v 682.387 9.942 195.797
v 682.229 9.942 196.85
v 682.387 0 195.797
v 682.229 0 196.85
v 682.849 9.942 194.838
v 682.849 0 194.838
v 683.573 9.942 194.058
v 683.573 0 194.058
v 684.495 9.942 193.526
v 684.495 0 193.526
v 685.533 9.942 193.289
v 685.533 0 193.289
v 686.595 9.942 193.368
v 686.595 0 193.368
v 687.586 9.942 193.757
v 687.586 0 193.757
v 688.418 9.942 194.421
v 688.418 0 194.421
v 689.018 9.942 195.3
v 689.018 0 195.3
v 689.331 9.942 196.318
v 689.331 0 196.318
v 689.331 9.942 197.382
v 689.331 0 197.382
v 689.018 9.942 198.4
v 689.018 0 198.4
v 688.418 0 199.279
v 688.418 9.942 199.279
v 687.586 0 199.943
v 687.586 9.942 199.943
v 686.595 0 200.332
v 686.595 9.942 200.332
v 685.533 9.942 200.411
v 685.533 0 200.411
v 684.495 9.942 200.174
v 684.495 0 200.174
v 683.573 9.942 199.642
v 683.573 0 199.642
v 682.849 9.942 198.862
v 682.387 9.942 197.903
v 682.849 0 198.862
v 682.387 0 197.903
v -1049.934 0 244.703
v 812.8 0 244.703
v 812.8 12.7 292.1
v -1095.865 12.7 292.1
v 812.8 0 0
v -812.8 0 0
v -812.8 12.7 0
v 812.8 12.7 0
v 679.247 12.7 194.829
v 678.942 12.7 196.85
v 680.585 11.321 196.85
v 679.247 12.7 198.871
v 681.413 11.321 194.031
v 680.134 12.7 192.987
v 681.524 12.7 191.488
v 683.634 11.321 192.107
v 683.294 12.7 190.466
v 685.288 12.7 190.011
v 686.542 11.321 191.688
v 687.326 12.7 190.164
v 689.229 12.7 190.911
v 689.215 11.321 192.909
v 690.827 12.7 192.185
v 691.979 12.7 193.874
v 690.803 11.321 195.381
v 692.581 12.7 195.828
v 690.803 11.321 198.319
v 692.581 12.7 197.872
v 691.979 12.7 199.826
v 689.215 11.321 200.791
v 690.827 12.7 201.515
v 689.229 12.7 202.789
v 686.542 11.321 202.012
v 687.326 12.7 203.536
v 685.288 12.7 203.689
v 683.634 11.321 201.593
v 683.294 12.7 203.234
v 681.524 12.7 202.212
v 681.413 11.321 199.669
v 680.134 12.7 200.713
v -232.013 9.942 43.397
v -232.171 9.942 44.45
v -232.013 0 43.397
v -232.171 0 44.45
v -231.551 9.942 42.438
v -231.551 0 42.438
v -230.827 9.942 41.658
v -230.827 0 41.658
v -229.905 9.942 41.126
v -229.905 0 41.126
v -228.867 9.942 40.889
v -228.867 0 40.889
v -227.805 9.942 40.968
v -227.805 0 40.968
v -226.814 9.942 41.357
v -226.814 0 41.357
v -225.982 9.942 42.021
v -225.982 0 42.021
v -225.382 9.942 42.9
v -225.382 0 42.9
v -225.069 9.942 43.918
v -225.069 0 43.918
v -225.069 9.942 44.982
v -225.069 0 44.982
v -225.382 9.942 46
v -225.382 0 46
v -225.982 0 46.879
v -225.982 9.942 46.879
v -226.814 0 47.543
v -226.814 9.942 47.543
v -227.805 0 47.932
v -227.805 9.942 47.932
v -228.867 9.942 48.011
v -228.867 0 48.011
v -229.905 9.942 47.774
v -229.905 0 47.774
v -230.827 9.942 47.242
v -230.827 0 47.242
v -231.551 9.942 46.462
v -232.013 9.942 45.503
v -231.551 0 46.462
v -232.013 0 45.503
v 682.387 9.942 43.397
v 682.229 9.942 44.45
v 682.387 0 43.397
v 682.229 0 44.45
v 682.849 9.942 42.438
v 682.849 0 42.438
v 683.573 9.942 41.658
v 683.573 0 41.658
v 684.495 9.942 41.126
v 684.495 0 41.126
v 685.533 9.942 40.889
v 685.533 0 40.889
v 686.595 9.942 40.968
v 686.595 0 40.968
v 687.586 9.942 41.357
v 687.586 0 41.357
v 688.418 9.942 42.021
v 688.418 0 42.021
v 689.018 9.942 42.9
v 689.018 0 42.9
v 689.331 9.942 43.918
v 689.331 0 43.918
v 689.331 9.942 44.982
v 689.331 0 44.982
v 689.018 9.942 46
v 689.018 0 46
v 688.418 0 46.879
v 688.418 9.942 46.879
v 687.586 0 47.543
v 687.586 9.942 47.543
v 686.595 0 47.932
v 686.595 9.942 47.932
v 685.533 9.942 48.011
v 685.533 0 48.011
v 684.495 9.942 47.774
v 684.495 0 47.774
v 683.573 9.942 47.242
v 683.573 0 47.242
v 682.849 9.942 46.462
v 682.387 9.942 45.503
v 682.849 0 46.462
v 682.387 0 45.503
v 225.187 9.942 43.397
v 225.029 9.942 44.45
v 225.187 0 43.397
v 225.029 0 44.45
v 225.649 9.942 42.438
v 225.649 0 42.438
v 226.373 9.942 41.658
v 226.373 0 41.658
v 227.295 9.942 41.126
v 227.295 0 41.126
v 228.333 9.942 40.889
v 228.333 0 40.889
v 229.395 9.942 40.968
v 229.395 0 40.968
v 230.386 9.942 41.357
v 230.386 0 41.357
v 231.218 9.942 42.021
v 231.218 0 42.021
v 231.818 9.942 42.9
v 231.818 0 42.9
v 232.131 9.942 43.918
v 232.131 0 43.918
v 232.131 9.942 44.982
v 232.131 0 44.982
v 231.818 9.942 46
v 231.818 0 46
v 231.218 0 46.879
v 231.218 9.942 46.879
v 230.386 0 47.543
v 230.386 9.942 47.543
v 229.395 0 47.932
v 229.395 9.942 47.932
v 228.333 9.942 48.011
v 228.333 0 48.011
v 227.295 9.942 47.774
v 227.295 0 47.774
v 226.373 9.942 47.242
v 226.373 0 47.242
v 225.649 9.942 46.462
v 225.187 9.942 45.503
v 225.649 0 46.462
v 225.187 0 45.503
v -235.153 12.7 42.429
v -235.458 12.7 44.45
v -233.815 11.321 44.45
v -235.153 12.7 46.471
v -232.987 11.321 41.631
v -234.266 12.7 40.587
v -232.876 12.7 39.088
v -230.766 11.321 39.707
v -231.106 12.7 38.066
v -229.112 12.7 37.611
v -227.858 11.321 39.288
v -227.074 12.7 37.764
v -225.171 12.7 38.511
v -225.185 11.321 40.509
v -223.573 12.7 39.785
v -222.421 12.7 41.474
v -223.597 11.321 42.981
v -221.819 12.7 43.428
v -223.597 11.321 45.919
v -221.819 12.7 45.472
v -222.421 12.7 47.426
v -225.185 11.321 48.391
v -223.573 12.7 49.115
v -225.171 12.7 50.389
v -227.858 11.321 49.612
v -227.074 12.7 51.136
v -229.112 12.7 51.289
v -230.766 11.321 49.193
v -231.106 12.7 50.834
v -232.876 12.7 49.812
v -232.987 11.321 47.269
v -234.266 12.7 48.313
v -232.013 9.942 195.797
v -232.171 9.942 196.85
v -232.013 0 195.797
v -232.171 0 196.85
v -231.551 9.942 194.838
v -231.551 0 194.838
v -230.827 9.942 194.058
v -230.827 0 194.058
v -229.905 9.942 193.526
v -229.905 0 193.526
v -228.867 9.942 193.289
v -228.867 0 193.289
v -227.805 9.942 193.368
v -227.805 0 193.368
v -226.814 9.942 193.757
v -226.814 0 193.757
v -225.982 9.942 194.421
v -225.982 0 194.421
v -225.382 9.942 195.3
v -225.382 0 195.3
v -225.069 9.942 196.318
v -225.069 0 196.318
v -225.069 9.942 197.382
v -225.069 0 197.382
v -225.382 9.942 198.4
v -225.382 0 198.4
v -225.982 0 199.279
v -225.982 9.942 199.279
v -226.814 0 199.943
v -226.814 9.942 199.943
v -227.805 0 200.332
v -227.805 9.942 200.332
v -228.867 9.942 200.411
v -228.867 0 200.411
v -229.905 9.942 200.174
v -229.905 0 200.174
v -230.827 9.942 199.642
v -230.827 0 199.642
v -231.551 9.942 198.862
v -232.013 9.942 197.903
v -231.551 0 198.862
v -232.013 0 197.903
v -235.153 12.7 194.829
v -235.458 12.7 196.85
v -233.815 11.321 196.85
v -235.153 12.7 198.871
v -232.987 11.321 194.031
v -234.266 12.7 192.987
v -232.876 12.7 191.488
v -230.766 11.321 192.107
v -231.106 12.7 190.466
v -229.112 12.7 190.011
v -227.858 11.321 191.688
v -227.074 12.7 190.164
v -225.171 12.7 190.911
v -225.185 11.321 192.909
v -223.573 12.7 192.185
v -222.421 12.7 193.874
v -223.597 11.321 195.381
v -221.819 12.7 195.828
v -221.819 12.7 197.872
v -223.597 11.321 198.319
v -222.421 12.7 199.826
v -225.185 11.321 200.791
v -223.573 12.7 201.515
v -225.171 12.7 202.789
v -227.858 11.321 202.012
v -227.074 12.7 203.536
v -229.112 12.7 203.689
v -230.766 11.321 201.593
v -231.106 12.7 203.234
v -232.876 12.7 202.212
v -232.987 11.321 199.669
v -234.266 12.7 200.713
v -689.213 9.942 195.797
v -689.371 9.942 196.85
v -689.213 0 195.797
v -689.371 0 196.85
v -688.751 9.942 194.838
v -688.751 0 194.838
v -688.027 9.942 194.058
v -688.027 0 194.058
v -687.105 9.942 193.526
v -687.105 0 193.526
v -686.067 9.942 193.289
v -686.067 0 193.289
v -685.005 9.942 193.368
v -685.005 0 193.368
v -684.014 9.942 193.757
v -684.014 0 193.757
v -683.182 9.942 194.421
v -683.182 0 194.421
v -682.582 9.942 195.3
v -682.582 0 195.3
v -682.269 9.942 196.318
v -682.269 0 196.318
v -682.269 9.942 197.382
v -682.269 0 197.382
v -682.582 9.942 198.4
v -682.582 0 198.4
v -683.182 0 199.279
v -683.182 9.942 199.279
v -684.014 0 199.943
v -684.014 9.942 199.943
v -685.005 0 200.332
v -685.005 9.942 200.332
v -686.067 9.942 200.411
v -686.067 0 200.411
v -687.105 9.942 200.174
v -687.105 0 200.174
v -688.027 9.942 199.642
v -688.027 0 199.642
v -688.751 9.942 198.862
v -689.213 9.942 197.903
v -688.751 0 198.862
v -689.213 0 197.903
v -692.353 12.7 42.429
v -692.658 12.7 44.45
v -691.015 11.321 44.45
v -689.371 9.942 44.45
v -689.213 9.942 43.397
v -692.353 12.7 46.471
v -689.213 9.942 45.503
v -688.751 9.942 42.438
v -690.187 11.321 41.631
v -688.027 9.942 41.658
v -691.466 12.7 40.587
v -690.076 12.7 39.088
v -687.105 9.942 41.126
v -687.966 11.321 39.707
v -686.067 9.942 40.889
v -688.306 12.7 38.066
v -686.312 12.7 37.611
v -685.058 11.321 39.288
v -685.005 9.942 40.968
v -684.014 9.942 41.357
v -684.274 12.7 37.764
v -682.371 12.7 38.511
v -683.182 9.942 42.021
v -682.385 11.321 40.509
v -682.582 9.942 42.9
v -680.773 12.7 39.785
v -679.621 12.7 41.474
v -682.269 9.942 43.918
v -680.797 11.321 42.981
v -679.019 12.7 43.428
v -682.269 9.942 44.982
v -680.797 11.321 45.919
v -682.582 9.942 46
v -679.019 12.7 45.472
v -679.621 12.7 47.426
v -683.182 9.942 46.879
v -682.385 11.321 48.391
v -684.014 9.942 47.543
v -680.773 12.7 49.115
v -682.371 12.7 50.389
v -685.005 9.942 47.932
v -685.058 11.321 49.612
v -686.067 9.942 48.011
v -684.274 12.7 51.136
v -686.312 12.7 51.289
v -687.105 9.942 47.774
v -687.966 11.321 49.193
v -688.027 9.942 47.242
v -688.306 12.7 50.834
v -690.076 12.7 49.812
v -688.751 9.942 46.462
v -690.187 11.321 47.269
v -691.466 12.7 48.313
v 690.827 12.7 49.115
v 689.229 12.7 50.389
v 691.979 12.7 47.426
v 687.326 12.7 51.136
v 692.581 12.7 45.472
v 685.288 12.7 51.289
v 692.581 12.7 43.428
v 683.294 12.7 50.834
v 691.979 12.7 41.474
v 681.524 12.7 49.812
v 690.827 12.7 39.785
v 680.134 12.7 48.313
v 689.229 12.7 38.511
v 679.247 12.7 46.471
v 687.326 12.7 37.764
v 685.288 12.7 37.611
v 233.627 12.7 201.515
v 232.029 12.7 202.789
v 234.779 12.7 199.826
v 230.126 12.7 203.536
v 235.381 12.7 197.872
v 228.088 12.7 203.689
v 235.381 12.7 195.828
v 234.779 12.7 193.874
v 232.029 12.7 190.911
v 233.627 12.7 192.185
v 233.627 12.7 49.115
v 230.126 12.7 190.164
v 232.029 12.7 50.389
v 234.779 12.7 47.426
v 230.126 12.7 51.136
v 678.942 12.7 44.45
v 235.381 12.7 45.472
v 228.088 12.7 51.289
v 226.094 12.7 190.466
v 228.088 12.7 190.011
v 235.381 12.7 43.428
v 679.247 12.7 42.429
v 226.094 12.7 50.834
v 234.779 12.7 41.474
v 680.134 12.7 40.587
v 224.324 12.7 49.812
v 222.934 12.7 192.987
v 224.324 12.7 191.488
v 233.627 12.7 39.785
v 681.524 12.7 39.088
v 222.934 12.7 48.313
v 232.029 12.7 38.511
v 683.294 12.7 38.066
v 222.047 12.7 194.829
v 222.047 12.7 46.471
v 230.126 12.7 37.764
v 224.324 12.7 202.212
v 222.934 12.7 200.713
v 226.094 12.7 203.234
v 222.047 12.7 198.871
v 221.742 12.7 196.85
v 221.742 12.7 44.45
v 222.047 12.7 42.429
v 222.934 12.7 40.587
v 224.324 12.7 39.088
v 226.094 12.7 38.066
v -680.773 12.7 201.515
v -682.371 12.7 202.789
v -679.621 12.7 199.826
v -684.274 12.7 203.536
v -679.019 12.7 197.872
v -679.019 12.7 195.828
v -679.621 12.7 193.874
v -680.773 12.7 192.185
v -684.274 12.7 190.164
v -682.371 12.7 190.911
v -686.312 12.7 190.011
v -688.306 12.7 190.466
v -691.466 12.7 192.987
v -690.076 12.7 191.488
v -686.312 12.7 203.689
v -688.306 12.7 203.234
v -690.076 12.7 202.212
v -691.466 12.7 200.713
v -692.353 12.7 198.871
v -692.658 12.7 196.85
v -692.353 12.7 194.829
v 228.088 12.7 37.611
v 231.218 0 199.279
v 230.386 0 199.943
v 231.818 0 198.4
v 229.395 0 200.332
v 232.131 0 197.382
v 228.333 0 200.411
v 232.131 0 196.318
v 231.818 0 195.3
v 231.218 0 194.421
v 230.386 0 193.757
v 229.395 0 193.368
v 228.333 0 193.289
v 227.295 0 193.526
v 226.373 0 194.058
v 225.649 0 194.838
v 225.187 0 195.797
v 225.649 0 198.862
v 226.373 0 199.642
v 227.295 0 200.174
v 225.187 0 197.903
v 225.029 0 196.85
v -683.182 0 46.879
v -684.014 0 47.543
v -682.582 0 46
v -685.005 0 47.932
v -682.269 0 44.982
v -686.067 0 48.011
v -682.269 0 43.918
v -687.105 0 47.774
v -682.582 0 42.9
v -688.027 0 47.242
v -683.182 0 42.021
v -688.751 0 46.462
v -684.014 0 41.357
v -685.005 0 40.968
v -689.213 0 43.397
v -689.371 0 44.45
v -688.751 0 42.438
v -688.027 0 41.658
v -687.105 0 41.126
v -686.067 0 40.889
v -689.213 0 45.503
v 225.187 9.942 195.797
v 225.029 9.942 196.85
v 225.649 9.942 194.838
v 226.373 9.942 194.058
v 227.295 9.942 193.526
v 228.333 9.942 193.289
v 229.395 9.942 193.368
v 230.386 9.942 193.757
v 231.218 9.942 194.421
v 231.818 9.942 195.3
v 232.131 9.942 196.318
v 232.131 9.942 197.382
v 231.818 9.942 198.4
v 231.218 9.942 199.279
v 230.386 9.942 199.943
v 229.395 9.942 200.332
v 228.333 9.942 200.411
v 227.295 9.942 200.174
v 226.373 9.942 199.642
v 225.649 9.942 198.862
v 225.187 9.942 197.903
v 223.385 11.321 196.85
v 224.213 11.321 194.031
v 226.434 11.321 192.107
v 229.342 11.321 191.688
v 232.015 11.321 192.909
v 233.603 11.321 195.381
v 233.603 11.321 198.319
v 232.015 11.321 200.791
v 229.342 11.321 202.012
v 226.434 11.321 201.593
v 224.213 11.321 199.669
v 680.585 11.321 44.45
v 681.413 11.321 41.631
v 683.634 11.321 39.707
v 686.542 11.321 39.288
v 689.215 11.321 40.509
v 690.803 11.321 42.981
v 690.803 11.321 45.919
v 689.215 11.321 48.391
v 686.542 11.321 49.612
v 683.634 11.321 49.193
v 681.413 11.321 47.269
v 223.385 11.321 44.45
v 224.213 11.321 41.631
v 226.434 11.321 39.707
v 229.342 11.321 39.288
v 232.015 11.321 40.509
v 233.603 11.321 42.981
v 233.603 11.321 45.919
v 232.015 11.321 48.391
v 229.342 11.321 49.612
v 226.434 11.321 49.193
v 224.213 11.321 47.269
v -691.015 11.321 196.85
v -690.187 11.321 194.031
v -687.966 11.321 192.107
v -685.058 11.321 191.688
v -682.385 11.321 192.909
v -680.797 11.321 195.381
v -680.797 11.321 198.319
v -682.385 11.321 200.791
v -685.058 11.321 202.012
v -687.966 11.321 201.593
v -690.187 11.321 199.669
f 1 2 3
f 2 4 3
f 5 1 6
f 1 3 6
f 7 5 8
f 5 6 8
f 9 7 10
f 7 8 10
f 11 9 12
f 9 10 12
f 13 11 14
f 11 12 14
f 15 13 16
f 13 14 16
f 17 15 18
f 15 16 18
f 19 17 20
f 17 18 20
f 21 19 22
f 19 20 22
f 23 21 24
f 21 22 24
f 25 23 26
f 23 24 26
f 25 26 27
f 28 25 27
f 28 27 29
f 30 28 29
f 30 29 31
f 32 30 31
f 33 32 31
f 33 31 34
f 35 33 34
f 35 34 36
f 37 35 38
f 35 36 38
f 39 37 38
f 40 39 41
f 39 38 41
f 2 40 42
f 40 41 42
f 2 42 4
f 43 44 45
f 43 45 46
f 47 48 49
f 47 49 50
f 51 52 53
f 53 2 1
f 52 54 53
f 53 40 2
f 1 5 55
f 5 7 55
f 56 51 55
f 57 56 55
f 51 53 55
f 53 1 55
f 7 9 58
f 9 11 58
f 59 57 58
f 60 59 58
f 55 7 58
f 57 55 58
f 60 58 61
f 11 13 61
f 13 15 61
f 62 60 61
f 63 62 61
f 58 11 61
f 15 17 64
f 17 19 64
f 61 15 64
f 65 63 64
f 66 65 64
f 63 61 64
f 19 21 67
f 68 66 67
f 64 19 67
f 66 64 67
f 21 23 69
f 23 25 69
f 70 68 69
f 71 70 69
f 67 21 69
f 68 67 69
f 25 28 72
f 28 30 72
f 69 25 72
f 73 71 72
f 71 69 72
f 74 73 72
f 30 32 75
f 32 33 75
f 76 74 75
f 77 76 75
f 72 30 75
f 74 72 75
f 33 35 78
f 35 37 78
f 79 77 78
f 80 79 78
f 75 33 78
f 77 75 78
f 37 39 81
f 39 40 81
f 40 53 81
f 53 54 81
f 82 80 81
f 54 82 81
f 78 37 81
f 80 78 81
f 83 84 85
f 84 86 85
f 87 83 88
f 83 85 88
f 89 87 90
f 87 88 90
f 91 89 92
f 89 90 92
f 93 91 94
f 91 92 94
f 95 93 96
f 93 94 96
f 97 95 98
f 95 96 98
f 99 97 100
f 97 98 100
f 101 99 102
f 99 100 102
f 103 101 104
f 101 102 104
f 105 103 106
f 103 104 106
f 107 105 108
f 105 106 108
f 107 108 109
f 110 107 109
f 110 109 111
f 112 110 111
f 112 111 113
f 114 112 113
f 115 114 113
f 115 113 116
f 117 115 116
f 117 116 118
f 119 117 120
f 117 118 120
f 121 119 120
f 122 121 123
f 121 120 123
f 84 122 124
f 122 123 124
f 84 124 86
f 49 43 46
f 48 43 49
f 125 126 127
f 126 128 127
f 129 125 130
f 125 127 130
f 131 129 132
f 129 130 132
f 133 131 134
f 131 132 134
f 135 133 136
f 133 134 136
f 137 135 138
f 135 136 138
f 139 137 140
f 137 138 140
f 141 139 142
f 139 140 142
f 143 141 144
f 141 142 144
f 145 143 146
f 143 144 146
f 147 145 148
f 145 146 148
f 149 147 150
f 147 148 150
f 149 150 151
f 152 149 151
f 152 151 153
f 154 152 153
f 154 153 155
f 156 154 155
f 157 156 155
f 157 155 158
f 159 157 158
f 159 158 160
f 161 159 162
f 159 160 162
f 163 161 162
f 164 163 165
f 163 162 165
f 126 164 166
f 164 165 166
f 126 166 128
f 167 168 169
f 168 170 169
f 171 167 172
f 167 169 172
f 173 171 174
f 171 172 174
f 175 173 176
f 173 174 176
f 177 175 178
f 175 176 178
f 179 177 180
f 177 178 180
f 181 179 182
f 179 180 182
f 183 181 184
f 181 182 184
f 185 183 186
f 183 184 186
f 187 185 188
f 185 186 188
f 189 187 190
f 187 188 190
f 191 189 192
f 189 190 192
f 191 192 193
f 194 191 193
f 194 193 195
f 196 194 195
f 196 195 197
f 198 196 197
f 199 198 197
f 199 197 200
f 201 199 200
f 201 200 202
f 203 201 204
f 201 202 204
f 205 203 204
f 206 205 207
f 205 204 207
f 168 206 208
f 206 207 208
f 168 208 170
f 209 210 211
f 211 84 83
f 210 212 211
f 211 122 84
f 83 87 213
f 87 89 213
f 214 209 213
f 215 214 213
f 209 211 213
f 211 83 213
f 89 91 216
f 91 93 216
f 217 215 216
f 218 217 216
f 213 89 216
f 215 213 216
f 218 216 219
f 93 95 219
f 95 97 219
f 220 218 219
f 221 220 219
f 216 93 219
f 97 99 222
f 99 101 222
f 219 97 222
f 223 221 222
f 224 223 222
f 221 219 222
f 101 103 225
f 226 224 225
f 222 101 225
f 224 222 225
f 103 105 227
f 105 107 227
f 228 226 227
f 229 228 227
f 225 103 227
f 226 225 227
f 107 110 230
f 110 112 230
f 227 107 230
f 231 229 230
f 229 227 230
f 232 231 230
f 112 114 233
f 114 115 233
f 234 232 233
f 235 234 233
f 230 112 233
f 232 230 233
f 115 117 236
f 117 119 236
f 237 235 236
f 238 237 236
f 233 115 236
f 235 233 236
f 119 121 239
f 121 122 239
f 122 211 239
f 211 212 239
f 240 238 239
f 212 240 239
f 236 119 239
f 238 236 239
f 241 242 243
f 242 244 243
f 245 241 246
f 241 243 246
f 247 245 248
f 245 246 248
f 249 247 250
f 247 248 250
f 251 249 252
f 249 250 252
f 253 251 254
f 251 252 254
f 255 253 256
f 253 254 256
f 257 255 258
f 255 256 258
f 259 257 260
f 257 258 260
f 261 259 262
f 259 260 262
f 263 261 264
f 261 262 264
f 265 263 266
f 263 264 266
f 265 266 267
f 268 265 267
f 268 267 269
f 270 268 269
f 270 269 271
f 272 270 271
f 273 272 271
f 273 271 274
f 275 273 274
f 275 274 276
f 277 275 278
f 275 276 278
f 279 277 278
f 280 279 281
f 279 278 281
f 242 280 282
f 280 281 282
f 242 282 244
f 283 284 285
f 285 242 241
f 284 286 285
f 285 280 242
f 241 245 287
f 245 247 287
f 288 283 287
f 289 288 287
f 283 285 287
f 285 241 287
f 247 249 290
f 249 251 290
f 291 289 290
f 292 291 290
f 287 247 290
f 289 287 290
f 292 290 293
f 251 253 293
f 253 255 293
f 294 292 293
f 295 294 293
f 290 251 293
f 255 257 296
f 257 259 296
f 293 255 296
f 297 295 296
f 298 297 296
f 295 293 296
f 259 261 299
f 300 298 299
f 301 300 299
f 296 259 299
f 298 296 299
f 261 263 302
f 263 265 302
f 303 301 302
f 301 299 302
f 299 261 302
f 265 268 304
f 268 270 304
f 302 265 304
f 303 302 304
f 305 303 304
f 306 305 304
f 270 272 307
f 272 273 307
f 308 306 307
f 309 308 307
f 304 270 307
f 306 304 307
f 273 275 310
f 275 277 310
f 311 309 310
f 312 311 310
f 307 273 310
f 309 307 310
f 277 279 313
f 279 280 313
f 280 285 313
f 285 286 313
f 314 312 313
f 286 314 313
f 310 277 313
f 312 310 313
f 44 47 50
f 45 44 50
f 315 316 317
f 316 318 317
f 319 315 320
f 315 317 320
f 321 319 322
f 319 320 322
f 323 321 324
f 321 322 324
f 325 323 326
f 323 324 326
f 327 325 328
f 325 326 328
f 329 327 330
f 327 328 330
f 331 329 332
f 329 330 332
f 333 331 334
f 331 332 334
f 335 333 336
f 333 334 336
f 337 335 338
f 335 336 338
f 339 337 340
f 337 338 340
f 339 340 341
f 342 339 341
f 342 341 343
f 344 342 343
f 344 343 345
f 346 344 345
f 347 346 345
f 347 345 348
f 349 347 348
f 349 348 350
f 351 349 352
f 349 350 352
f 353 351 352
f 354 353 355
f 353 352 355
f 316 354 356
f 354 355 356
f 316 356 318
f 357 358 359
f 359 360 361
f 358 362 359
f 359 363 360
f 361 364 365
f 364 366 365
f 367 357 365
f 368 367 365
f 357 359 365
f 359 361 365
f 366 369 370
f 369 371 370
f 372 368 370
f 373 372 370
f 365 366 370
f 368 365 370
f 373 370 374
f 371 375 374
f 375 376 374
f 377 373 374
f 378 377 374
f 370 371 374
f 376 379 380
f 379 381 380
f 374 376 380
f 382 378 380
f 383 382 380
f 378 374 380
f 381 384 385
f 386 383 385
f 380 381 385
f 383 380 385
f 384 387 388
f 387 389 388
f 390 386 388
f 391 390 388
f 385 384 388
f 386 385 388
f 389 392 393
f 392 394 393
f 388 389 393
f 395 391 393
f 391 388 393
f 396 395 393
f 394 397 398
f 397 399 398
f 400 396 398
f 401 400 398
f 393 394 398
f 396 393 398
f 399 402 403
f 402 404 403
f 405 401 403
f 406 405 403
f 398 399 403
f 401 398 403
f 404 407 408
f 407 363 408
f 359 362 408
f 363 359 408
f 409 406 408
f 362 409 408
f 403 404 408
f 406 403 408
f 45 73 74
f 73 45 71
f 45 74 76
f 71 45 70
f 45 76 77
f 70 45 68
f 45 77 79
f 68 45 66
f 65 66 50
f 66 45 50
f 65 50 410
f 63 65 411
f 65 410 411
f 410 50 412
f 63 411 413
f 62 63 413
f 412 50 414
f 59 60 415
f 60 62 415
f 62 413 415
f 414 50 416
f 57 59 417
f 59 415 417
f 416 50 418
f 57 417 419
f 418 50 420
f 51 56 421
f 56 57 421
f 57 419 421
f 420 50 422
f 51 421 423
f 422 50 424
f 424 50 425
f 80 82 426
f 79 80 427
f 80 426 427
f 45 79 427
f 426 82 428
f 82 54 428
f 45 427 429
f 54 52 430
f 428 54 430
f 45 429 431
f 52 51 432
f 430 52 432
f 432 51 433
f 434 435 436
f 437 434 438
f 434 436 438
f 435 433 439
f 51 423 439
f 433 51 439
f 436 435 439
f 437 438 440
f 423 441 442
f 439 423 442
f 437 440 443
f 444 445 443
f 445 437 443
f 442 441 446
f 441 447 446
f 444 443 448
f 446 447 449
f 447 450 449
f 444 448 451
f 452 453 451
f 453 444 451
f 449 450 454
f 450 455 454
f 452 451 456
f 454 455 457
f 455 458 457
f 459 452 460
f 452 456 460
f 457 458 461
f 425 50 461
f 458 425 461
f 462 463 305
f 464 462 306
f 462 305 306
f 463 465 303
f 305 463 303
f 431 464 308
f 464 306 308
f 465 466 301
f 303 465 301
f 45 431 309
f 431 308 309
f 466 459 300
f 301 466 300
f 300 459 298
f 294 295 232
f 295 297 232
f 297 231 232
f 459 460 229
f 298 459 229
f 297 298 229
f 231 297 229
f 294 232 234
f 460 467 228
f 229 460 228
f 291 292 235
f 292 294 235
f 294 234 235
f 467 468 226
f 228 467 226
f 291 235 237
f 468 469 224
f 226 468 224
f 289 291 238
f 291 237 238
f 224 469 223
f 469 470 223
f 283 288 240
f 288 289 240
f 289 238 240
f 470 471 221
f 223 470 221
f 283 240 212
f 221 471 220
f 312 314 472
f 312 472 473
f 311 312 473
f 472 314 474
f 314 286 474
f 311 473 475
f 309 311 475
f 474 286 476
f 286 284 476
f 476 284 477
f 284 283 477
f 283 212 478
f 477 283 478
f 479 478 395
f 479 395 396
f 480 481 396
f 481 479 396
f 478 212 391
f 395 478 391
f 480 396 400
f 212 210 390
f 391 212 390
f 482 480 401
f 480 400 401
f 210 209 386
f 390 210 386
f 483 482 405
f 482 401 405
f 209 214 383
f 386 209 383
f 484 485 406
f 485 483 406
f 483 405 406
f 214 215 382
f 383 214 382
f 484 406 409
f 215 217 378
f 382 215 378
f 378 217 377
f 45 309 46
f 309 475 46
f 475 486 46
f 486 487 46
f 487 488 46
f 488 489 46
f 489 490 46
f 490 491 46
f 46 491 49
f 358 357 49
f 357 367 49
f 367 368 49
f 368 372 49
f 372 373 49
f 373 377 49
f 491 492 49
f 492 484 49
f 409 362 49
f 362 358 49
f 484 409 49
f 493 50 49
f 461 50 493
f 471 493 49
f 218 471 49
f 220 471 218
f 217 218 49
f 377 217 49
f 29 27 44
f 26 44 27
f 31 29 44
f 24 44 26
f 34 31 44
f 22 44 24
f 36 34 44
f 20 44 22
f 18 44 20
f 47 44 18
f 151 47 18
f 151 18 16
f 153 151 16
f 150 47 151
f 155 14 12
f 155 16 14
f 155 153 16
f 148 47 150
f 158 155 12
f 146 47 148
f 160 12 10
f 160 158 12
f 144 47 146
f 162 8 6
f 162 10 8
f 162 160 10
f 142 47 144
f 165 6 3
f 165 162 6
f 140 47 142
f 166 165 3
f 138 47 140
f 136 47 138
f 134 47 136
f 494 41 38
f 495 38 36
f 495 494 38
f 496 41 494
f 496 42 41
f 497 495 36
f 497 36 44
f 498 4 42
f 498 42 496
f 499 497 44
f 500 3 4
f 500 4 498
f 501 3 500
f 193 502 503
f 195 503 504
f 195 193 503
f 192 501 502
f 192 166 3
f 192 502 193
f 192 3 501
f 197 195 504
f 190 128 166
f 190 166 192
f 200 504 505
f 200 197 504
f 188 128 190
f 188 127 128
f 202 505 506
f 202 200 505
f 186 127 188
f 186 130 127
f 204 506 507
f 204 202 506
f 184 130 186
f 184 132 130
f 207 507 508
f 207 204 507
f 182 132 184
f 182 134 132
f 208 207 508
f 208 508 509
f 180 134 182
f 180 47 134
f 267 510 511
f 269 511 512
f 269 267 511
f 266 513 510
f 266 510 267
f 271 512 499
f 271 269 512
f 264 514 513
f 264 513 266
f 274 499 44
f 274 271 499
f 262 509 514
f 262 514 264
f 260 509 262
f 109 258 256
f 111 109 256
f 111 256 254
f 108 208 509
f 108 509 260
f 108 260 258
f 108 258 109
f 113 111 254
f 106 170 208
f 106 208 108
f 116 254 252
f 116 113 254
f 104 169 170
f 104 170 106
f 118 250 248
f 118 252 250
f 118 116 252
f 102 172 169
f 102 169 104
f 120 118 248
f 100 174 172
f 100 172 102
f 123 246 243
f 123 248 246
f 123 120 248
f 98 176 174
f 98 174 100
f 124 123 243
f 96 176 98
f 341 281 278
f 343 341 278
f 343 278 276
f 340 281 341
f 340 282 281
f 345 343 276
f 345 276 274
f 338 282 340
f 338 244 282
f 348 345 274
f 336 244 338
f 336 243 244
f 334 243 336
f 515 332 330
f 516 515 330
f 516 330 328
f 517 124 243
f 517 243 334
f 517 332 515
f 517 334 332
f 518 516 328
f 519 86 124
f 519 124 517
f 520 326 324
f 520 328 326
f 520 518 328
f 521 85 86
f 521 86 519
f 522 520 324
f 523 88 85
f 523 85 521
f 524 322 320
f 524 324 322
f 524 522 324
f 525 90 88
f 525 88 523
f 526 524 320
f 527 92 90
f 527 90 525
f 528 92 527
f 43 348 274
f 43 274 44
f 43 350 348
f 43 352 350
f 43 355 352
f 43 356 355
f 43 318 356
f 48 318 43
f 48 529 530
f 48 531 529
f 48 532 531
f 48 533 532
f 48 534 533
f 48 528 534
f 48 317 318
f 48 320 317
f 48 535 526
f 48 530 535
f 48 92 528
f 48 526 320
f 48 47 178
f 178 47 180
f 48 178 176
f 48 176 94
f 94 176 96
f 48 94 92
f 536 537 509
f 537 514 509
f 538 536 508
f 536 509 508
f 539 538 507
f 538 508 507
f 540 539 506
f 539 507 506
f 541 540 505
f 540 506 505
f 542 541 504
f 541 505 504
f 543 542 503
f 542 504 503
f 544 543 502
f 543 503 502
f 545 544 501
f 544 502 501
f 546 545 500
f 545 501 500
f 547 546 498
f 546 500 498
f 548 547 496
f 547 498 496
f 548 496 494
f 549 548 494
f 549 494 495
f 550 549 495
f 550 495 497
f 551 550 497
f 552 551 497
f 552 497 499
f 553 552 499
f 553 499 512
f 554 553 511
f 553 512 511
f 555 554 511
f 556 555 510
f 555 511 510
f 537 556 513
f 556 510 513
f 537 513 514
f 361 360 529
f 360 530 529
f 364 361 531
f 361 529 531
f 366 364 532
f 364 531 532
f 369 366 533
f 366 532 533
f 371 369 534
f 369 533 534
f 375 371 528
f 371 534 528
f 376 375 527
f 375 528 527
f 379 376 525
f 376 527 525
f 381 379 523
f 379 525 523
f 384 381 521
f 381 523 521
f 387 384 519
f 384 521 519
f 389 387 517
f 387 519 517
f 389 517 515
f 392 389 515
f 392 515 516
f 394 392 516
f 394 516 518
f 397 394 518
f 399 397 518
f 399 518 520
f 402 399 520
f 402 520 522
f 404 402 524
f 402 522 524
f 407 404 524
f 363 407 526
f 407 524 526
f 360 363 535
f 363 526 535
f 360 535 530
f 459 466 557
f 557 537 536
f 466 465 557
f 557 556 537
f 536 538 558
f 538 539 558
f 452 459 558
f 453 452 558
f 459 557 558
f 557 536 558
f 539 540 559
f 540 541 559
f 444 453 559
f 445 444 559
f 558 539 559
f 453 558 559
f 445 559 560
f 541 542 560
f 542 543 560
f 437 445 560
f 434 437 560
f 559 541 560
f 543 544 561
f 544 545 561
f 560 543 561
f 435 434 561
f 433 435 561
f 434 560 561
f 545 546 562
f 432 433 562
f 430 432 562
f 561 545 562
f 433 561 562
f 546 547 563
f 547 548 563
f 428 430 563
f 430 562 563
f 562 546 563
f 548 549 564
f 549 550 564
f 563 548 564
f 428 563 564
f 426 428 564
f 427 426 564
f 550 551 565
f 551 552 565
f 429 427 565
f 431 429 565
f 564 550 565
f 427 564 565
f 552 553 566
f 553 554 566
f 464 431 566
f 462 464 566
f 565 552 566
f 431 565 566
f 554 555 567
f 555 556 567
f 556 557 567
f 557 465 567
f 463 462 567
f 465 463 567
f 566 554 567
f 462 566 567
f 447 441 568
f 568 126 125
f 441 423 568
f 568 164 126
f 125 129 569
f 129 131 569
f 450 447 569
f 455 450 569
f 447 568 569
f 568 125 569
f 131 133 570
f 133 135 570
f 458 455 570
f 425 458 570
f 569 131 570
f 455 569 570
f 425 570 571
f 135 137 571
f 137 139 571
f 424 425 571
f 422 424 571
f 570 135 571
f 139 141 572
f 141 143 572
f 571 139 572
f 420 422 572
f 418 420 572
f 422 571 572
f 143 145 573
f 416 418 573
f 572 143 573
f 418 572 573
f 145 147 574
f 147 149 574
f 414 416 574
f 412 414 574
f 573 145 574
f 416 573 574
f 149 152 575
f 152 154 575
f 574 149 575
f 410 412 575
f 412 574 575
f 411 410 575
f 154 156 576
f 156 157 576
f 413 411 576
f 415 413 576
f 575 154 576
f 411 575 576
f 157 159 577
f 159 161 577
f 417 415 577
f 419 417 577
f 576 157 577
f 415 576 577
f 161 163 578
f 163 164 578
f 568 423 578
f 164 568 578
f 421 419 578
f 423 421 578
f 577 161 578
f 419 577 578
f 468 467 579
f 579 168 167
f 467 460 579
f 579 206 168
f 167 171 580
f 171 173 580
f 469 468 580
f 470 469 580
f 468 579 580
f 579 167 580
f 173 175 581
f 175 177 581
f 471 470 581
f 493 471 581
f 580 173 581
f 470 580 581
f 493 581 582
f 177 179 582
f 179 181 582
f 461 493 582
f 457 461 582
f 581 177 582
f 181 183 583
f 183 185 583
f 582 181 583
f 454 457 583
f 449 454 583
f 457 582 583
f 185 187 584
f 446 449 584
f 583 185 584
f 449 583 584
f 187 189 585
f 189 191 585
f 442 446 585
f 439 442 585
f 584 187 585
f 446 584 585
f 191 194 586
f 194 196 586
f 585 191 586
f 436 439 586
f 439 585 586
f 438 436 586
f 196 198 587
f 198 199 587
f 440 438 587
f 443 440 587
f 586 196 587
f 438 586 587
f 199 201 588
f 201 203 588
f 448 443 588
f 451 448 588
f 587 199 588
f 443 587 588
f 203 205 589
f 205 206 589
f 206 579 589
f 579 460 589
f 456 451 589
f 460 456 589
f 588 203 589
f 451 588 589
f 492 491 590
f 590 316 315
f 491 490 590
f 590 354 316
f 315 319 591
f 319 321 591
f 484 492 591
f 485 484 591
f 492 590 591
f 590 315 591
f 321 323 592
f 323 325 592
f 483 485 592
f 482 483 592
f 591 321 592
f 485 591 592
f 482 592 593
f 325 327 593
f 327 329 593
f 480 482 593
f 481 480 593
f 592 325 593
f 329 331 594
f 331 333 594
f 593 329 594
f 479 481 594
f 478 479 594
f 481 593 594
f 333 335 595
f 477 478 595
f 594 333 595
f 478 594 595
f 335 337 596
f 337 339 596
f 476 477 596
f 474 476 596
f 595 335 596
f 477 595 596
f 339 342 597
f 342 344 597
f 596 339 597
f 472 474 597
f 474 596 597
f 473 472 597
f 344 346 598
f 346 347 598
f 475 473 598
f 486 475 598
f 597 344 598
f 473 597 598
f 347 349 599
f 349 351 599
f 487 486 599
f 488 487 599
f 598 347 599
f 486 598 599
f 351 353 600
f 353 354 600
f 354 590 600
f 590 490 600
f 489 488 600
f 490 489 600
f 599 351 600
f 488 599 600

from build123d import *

# Parameters (mm, degrees)
BOSS_EXTRUDE1_DEPTH                                 = 12.7
CHAMFER1_SIZE2                                      = 47.397045256
CHAMFER1_SIZE                                       = 12.7
CSK_FOR_1_4_FLAT_HEAD_MACHINE_SCREW_100_D           = 7.14248
CSK_FOR_1_4_FLAT_HEAD_MACHINE_SCREW_100_CSINK_D     = 13.716
CSK_FOR_1_4_FLAT_HEAD_MACHINE_SCREW_100_CSINK_ANGLE = 100
LPATTERN1_COUNT                                     = 4
LPATTERN1_PITCH                                     = 457.2


with BuildPart() as part:
    # Sketch1 → Boss-Extrude1 (new body)
    with BuildSketch(Plane(origin=(0, 0, 0), x_dir=(1, 0, 0), z_dir=(0, 1, 0))):
        Polygon((-812.8, 0), (812.8, 0), (812.8, -292.1), (-1095.864592562, -292.1), align=None)
    extrude(amount=BOSS_EXTRUDE1_DEPTH)

    # Chamfer1
    chamfer1_edges = [part.edges().sort_by_distance(p)[0] for p in [
        (-141.532296281, 0, 292.1),
    ]]
    chamfer1_side = [part.faces().sort_by_distance(p)[0] for p in [
        (-141.532296281, 0.254, 292.1),
    ]]
    chamfer(chamfer1_edges, length=CHAMFER1_SIZE - 0.0001, length2=CHAMFER1_SIZE2 - 0.0001, reference=chamfer1_side[0])  # a hair under: the kernel refuses the full size

    # CSK for 1/4 Flat Head Machine Screw (100)1 (through all)
    with Locations(Plane(origin=(0, 12.7, 0), x_dir=(1, 0, 0), z_dir=(0, 1, 0))):
        with Locations((-685.8, -44.45), (-685.8, -196.85)):
            csk_for_1_4_flat_head_machine_screw_100 = CounterSinkHole(CSK_FOR_1_4_FLAT_HEAD_MACHINE_SCREW_100_D / 2, CSK_FOR_1_4_FLAT_HEAD_MACHINE_SCREW_100_CSINK_D / 2, counter_sink_angle=CSK_FOR_1_4_FLAT_HEAD_MACHINE_SCREW_100_CSINK_ANGLE)

    # LPattern1: CSK for 1/4 Flat Head Machine Screw (100)1 ×4
    with Locations(*[(i * LPATTERN1_PITCH, 0, 0) for i in range(1, LPATTERN1_COUNT)]):
        add(csk_for_1_4_flat_head_machine_screw_100, mode=Mode.SUBTRACT)


solid = part.part
